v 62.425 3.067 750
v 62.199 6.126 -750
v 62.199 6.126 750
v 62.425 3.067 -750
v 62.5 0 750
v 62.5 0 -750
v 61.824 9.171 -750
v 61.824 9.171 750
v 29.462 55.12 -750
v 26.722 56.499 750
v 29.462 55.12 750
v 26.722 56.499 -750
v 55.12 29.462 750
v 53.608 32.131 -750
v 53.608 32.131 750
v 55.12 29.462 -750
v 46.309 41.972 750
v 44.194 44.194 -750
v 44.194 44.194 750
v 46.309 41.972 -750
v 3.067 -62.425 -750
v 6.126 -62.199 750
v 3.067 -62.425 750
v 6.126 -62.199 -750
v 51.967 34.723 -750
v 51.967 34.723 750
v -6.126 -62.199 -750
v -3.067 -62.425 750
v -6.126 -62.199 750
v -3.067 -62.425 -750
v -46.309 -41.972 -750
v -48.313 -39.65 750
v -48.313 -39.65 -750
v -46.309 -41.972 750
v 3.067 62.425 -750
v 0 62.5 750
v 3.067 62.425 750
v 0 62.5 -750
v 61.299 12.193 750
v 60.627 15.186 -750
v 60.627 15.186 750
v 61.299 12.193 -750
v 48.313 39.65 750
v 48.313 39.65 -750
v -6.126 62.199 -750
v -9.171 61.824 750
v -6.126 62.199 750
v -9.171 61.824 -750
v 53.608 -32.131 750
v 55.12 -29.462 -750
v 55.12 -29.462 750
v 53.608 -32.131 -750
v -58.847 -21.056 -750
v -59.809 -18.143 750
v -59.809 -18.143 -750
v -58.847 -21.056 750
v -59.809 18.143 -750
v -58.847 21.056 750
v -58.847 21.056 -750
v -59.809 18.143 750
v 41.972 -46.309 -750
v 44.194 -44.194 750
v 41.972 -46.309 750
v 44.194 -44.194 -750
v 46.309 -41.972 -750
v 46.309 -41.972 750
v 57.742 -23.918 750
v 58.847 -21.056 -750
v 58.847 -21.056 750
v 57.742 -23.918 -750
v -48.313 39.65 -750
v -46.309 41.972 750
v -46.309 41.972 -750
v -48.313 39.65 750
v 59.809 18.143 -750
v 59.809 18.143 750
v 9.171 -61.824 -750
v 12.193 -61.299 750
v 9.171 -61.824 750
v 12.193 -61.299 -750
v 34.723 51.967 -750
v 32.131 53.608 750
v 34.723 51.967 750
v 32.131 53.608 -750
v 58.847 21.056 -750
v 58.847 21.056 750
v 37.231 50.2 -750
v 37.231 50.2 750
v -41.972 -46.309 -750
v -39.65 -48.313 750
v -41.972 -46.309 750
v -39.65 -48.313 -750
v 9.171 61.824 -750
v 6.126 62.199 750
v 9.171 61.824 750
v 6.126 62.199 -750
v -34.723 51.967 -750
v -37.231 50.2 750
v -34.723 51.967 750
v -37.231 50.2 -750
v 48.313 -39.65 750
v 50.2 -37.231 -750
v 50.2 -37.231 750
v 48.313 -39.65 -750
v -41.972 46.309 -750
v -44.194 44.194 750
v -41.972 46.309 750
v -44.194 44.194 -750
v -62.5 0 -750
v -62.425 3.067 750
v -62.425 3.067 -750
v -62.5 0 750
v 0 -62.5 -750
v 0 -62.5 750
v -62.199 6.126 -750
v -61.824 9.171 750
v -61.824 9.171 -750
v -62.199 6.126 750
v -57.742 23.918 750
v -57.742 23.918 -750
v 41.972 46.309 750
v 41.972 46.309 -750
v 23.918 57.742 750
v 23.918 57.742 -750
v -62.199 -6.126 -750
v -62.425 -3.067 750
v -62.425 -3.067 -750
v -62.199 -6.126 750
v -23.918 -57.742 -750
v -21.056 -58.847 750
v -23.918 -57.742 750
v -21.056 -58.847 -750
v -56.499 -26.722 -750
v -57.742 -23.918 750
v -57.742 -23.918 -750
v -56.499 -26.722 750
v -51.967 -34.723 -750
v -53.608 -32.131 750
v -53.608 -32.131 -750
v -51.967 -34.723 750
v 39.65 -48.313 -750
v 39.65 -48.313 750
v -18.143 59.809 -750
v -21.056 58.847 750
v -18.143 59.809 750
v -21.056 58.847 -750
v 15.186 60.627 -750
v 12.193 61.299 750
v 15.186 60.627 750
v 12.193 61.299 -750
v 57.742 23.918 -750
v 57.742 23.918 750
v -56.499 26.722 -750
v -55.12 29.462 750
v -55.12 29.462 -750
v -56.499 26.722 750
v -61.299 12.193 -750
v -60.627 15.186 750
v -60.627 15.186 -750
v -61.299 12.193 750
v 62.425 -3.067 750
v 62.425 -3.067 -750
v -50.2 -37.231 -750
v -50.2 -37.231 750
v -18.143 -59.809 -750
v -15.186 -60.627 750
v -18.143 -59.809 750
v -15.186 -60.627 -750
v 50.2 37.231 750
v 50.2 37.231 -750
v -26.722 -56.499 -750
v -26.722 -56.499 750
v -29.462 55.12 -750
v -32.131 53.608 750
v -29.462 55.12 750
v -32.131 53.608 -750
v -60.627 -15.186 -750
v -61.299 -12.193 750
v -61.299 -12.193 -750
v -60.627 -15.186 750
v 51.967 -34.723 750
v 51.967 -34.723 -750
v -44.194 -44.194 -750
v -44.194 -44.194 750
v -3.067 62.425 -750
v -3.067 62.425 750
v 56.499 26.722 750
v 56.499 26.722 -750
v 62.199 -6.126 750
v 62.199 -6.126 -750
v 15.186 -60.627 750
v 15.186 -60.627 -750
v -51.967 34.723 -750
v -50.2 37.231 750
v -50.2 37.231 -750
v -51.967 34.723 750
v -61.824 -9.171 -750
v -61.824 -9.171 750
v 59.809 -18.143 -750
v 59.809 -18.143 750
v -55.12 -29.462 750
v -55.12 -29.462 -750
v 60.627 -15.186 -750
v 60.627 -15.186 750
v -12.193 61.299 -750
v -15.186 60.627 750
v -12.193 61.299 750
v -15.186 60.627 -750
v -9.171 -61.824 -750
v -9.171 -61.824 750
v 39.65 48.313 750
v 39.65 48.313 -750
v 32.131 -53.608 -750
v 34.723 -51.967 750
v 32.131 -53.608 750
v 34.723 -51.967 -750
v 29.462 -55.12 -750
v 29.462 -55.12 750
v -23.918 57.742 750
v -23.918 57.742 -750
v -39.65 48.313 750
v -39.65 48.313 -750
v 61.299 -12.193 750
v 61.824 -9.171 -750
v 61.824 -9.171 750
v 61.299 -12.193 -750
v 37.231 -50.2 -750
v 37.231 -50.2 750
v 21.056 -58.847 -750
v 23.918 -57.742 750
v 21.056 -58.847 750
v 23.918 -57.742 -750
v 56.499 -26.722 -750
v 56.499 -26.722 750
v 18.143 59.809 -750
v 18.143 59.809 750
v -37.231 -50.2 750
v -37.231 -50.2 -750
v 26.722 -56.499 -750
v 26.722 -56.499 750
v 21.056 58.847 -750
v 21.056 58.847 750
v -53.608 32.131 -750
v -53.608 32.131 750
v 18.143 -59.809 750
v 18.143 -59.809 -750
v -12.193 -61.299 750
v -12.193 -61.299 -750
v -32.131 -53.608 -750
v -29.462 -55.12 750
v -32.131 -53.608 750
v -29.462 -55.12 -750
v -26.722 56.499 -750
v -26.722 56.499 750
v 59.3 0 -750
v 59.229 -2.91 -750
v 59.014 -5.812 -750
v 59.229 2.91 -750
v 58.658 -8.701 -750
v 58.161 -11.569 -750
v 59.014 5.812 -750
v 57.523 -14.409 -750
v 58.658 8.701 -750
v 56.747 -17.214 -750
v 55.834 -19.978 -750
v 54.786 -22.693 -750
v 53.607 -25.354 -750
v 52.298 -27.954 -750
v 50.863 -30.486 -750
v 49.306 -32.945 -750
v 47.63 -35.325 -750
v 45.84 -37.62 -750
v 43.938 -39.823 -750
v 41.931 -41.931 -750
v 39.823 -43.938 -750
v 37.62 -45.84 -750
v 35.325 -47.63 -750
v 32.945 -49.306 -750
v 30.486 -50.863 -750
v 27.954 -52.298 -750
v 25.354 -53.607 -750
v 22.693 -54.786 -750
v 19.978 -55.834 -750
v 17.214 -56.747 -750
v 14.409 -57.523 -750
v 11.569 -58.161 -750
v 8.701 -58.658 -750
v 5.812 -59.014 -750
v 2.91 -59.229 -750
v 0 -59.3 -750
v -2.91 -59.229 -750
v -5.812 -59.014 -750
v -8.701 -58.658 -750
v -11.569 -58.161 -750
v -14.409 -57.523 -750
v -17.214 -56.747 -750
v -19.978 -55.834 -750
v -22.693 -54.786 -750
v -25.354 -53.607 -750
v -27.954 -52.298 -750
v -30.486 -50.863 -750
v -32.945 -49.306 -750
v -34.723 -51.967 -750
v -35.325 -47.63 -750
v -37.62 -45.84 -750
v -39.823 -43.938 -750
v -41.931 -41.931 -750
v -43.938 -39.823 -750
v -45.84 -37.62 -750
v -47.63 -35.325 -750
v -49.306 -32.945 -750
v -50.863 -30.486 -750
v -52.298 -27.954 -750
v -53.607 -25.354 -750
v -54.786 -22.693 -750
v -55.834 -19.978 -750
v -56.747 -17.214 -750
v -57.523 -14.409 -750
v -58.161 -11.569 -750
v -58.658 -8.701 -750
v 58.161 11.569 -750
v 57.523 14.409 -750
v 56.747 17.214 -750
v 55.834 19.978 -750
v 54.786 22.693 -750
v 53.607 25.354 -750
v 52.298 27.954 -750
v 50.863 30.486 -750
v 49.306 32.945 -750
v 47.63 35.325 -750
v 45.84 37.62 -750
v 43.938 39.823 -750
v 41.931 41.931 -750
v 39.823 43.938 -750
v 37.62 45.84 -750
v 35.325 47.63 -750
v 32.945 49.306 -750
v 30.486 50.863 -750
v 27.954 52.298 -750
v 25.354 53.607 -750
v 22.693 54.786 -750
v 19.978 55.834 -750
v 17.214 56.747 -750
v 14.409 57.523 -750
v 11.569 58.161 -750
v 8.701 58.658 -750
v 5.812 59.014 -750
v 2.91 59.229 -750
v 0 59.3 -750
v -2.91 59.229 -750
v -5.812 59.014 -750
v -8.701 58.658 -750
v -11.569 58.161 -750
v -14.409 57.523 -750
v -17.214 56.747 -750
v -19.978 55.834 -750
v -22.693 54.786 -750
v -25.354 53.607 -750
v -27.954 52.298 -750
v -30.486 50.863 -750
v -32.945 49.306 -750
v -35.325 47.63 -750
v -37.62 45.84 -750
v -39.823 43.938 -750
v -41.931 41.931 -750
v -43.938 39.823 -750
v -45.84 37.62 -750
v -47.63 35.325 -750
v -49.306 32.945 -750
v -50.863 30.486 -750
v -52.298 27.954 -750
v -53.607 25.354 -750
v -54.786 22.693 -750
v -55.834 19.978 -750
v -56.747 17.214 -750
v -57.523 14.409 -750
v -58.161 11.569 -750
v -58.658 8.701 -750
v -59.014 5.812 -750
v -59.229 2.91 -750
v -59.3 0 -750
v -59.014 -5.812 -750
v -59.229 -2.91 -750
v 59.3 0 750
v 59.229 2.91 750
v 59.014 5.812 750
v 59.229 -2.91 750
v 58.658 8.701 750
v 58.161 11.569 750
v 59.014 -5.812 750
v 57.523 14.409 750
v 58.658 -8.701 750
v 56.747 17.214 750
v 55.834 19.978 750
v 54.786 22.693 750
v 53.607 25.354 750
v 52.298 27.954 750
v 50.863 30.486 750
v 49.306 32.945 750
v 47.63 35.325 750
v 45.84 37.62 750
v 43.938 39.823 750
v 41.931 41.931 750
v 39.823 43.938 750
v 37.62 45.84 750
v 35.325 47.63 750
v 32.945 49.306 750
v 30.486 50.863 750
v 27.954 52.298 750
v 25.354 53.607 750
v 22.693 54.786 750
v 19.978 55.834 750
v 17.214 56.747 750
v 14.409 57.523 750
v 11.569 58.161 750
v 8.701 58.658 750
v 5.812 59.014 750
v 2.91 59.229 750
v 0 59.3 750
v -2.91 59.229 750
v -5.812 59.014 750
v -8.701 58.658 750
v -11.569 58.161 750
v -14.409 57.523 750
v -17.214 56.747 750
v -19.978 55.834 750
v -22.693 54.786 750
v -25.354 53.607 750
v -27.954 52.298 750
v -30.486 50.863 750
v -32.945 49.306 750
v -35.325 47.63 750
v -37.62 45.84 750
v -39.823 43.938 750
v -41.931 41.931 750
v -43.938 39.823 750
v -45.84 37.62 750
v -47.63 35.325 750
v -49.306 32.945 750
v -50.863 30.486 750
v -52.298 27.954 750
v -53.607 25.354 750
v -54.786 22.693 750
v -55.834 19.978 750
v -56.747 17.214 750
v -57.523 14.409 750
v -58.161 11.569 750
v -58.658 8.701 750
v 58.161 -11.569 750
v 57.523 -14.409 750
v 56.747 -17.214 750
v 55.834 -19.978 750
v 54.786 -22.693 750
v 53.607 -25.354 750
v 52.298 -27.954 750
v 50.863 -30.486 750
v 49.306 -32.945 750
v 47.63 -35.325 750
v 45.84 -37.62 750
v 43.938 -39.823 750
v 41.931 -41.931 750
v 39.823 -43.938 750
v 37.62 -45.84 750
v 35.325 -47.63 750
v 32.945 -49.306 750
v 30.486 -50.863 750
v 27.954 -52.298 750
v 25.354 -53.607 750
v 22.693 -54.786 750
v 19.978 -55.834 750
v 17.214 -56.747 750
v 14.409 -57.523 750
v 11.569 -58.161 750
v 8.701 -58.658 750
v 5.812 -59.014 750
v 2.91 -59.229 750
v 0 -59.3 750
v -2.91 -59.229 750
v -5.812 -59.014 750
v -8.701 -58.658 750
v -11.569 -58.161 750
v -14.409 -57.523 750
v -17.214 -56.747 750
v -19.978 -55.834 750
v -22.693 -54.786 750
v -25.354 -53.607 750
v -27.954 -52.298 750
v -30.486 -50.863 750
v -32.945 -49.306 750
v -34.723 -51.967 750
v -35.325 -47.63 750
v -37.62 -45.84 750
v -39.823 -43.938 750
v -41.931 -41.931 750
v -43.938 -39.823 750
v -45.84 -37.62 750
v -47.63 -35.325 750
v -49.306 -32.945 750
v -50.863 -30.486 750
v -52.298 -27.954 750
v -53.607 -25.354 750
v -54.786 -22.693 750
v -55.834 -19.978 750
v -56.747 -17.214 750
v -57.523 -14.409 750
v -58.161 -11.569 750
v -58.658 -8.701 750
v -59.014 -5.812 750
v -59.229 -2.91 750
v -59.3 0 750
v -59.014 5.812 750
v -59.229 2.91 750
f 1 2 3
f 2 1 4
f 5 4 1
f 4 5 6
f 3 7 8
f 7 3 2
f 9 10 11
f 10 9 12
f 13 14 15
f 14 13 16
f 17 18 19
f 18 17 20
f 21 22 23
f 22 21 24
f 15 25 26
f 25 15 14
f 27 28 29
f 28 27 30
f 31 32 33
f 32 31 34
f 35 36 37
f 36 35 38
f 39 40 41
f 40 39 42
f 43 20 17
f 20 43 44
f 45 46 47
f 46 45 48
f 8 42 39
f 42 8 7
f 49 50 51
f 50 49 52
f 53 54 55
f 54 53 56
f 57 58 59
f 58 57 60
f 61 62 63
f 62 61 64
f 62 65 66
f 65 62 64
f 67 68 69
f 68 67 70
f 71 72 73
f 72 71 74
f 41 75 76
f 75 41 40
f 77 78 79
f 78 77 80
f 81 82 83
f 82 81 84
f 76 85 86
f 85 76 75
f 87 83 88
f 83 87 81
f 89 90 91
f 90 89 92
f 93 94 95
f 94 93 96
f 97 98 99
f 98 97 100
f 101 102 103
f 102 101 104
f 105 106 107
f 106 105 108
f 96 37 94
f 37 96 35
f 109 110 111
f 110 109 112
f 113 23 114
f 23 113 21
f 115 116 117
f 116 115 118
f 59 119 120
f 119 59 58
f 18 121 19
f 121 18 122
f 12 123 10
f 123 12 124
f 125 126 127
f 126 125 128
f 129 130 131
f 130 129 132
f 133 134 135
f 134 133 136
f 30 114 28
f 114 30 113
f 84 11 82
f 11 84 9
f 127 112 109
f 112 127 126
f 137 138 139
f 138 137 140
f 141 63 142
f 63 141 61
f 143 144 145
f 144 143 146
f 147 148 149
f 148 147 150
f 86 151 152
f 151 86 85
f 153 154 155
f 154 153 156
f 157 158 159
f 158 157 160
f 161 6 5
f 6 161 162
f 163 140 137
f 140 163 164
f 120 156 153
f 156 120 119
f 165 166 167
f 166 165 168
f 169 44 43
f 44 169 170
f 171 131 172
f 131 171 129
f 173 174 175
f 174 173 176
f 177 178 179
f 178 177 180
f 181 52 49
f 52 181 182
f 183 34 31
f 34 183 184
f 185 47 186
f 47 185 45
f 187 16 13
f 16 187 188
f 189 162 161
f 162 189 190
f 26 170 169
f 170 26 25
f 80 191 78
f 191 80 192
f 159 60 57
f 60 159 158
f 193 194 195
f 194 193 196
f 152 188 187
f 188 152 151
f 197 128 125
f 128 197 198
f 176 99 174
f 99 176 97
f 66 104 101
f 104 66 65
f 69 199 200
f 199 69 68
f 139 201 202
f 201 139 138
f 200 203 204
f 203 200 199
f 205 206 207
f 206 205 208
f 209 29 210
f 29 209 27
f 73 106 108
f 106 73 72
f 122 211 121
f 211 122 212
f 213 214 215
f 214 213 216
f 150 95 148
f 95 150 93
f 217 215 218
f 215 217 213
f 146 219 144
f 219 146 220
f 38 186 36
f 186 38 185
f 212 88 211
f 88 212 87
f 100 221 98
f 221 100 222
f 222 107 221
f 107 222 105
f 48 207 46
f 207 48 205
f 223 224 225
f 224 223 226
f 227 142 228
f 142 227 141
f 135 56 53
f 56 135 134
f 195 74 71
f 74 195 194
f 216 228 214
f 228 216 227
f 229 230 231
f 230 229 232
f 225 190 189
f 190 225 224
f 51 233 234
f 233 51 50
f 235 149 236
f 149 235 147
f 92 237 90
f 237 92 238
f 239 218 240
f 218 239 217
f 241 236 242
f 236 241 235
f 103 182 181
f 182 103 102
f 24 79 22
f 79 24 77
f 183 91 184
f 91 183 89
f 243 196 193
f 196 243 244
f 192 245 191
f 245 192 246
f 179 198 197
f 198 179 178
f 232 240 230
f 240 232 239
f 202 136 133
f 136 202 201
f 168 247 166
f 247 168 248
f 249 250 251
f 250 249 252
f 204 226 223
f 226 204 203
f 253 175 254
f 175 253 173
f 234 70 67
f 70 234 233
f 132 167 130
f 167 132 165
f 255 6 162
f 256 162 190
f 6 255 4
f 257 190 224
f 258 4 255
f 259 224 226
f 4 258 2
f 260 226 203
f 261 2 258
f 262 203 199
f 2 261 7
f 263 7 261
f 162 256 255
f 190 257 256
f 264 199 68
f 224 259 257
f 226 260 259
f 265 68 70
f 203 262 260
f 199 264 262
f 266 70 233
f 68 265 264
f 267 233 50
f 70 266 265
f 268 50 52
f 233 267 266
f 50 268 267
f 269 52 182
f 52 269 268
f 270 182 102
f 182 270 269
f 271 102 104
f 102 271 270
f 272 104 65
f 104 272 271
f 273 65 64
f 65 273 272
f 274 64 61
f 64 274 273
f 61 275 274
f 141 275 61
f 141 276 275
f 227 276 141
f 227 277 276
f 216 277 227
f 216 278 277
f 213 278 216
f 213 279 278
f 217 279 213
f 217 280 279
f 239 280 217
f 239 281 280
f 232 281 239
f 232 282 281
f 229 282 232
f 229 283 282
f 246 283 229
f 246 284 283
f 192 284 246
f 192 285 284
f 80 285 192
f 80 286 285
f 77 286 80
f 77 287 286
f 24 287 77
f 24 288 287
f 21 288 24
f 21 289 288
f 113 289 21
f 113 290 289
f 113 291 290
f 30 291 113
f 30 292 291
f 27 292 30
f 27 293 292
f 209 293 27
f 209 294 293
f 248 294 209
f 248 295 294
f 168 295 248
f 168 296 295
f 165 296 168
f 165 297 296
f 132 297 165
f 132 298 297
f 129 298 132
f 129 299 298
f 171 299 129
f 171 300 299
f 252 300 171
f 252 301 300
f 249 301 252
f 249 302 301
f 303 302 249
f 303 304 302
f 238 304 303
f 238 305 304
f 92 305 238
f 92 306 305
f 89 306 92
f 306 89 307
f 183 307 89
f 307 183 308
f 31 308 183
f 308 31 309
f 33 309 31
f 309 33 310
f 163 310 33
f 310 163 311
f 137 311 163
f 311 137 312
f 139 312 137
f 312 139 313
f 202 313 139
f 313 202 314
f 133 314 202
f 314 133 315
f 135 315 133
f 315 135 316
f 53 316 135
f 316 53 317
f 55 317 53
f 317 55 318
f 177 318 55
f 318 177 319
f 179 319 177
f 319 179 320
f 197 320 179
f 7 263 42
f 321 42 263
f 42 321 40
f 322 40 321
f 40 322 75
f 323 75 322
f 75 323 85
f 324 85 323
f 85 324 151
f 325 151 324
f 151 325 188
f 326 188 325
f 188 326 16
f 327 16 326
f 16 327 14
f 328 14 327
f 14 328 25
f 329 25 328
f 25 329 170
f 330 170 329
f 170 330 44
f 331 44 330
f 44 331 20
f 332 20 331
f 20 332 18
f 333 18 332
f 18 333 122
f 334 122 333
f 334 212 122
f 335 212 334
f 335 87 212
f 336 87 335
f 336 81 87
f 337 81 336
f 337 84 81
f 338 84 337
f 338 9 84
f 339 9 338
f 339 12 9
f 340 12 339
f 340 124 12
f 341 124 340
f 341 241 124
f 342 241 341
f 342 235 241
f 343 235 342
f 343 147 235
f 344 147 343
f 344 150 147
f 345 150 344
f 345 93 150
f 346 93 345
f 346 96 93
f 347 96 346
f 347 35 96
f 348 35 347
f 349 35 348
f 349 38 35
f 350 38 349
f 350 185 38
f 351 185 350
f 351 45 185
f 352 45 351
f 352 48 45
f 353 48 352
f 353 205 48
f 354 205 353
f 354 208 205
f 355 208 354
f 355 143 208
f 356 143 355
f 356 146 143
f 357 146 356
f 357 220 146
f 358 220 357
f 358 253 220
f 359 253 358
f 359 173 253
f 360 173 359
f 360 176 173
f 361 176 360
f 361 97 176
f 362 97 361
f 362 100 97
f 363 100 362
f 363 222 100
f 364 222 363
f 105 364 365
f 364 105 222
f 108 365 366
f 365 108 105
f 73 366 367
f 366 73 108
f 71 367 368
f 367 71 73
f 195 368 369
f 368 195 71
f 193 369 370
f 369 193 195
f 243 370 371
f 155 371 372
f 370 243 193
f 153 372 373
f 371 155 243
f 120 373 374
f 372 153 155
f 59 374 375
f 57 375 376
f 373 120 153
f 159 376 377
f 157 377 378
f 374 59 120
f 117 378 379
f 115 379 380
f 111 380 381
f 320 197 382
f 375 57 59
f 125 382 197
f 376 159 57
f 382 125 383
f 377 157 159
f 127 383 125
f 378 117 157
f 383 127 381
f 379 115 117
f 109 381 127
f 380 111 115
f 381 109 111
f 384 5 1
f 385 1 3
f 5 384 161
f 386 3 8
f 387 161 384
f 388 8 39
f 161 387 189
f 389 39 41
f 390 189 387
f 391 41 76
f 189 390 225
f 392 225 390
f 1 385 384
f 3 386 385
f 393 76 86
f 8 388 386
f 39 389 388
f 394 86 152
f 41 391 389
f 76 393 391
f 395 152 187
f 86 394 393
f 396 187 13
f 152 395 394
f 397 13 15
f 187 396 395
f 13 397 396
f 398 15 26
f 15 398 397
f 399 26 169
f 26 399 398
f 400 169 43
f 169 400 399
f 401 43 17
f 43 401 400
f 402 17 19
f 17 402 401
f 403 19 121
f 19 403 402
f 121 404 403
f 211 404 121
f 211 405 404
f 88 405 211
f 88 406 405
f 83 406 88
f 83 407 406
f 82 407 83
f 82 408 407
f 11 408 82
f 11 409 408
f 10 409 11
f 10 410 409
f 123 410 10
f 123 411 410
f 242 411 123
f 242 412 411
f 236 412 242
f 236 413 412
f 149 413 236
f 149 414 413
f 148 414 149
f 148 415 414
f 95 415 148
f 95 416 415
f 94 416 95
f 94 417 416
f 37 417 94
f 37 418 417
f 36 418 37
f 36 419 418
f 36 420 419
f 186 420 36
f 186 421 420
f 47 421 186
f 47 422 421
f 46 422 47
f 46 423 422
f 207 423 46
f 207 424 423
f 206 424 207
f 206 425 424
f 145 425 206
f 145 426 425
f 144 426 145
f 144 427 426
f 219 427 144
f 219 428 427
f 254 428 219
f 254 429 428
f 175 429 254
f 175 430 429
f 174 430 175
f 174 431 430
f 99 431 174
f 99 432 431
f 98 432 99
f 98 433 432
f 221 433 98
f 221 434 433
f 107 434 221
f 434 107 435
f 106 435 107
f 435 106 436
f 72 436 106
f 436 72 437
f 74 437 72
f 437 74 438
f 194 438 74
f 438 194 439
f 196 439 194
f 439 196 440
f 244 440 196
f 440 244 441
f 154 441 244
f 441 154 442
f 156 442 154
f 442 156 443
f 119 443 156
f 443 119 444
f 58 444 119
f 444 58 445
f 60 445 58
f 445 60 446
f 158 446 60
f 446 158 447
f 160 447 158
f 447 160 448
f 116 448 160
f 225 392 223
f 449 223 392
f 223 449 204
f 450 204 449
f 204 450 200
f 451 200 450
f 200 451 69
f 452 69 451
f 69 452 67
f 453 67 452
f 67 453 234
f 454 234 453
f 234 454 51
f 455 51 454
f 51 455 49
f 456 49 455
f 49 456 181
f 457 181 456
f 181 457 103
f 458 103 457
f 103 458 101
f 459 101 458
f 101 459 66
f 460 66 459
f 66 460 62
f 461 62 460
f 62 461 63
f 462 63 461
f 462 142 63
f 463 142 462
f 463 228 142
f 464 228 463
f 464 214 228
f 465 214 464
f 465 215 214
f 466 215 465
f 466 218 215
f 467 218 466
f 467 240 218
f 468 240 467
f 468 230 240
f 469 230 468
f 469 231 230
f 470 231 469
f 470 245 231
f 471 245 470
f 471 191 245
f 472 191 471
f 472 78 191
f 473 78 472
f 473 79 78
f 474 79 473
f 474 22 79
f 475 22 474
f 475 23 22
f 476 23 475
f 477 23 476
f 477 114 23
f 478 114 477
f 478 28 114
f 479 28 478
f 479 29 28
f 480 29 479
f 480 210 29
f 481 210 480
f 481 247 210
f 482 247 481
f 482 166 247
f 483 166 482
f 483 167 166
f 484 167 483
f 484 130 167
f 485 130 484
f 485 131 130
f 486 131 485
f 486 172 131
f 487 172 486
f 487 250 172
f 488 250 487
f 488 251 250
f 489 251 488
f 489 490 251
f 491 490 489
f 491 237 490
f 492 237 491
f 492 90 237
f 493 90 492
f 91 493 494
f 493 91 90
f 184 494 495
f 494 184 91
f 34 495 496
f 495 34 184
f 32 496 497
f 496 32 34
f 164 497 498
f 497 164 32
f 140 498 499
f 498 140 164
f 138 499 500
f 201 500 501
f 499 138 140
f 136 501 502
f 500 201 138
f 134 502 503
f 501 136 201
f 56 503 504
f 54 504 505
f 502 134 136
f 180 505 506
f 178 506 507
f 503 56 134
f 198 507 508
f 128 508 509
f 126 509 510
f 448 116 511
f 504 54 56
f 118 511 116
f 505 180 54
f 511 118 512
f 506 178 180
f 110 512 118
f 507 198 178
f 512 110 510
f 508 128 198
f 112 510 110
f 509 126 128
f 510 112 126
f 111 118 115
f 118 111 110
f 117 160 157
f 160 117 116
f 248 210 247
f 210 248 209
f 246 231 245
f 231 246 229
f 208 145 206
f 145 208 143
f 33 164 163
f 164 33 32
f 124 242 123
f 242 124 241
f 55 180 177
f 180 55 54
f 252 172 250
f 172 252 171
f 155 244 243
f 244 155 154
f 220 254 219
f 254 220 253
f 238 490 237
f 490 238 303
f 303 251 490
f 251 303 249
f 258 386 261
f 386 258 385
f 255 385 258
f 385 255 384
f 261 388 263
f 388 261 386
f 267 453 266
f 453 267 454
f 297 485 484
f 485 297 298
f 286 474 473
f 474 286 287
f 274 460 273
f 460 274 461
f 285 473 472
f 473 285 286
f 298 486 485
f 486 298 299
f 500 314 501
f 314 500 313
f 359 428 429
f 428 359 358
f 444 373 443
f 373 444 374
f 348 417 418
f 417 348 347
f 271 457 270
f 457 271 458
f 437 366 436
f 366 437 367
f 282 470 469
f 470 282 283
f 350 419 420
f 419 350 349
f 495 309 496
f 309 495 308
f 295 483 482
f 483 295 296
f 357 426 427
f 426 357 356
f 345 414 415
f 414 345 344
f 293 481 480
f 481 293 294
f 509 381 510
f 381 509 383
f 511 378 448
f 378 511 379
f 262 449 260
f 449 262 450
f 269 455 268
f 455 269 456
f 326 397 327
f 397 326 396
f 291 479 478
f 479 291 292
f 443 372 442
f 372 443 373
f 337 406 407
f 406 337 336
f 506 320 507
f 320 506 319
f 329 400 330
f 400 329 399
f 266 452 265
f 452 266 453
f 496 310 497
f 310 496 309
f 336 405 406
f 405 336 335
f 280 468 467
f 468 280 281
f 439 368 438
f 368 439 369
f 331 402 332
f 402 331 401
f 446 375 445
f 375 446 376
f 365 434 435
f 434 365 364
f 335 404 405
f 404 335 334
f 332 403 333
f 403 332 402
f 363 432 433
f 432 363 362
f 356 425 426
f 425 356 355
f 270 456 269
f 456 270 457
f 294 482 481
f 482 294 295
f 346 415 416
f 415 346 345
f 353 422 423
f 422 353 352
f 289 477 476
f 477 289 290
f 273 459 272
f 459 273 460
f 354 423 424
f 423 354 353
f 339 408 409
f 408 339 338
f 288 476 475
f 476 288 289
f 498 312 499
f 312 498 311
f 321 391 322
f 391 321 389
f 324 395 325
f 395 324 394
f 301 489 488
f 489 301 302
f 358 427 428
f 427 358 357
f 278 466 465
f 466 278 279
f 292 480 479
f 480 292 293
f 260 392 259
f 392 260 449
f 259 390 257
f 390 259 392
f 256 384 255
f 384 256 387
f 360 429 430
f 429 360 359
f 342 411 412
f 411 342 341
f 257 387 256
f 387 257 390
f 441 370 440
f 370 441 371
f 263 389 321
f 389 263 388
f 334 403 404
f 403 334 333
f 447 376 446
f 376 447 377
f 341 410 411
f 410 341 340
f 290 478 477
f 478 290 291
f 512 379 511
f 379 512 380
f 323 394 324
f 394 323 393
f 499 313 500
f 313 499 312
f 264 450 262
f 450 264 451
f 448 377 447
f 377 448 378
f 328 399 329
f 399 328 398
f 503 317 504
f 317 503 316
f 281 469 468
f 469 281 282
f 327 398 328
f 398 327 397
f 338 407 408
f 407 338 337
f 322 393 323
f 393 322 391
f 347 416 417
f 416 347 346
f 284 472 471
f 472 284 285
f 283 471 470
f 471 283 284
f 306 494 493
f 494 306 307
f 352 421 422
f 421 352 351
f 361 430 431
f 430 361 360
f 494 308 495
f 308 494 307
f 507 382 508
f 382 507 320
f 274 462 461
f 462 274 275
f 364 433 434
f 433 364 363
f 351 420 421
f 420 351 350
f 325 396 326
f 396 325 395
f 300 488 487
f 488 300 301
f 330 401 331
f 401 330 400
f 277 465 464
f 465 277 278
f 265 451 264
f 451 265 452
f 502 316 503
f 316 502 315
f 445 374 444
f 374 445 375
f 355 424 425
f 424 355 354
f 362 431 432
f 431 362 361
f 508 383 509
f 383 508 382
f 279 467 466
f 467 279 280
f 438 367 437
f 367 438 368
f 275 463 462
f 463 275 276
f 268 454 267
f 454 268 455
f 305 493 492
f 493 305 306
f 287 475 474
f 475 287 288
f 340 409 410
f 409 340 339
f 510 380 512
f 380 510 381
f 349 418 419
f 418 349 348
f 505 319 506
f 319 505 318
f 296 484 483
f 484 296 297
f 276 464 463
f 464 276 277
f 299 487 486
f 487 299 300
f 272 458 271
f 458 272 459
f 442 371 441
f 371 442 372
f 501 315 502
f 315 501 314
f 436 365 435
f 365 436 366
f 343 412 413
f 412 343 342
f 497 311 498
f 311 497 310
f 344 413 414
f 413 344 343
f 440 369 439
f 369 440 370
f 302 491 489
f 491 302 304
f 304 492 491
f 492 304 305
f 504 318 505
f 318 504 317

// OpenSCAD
$fn=128;

module ht_pipe(od=125, length=1500, wall=3.2) {
    id = od - 2*wall;
    difference() {
        cylinder(h=length, d=od, center=true);
        cylinder(h=length+2, d=id, center=true);
    }
}

ht_pipe(od=125, length=1500, wall=3.2);
